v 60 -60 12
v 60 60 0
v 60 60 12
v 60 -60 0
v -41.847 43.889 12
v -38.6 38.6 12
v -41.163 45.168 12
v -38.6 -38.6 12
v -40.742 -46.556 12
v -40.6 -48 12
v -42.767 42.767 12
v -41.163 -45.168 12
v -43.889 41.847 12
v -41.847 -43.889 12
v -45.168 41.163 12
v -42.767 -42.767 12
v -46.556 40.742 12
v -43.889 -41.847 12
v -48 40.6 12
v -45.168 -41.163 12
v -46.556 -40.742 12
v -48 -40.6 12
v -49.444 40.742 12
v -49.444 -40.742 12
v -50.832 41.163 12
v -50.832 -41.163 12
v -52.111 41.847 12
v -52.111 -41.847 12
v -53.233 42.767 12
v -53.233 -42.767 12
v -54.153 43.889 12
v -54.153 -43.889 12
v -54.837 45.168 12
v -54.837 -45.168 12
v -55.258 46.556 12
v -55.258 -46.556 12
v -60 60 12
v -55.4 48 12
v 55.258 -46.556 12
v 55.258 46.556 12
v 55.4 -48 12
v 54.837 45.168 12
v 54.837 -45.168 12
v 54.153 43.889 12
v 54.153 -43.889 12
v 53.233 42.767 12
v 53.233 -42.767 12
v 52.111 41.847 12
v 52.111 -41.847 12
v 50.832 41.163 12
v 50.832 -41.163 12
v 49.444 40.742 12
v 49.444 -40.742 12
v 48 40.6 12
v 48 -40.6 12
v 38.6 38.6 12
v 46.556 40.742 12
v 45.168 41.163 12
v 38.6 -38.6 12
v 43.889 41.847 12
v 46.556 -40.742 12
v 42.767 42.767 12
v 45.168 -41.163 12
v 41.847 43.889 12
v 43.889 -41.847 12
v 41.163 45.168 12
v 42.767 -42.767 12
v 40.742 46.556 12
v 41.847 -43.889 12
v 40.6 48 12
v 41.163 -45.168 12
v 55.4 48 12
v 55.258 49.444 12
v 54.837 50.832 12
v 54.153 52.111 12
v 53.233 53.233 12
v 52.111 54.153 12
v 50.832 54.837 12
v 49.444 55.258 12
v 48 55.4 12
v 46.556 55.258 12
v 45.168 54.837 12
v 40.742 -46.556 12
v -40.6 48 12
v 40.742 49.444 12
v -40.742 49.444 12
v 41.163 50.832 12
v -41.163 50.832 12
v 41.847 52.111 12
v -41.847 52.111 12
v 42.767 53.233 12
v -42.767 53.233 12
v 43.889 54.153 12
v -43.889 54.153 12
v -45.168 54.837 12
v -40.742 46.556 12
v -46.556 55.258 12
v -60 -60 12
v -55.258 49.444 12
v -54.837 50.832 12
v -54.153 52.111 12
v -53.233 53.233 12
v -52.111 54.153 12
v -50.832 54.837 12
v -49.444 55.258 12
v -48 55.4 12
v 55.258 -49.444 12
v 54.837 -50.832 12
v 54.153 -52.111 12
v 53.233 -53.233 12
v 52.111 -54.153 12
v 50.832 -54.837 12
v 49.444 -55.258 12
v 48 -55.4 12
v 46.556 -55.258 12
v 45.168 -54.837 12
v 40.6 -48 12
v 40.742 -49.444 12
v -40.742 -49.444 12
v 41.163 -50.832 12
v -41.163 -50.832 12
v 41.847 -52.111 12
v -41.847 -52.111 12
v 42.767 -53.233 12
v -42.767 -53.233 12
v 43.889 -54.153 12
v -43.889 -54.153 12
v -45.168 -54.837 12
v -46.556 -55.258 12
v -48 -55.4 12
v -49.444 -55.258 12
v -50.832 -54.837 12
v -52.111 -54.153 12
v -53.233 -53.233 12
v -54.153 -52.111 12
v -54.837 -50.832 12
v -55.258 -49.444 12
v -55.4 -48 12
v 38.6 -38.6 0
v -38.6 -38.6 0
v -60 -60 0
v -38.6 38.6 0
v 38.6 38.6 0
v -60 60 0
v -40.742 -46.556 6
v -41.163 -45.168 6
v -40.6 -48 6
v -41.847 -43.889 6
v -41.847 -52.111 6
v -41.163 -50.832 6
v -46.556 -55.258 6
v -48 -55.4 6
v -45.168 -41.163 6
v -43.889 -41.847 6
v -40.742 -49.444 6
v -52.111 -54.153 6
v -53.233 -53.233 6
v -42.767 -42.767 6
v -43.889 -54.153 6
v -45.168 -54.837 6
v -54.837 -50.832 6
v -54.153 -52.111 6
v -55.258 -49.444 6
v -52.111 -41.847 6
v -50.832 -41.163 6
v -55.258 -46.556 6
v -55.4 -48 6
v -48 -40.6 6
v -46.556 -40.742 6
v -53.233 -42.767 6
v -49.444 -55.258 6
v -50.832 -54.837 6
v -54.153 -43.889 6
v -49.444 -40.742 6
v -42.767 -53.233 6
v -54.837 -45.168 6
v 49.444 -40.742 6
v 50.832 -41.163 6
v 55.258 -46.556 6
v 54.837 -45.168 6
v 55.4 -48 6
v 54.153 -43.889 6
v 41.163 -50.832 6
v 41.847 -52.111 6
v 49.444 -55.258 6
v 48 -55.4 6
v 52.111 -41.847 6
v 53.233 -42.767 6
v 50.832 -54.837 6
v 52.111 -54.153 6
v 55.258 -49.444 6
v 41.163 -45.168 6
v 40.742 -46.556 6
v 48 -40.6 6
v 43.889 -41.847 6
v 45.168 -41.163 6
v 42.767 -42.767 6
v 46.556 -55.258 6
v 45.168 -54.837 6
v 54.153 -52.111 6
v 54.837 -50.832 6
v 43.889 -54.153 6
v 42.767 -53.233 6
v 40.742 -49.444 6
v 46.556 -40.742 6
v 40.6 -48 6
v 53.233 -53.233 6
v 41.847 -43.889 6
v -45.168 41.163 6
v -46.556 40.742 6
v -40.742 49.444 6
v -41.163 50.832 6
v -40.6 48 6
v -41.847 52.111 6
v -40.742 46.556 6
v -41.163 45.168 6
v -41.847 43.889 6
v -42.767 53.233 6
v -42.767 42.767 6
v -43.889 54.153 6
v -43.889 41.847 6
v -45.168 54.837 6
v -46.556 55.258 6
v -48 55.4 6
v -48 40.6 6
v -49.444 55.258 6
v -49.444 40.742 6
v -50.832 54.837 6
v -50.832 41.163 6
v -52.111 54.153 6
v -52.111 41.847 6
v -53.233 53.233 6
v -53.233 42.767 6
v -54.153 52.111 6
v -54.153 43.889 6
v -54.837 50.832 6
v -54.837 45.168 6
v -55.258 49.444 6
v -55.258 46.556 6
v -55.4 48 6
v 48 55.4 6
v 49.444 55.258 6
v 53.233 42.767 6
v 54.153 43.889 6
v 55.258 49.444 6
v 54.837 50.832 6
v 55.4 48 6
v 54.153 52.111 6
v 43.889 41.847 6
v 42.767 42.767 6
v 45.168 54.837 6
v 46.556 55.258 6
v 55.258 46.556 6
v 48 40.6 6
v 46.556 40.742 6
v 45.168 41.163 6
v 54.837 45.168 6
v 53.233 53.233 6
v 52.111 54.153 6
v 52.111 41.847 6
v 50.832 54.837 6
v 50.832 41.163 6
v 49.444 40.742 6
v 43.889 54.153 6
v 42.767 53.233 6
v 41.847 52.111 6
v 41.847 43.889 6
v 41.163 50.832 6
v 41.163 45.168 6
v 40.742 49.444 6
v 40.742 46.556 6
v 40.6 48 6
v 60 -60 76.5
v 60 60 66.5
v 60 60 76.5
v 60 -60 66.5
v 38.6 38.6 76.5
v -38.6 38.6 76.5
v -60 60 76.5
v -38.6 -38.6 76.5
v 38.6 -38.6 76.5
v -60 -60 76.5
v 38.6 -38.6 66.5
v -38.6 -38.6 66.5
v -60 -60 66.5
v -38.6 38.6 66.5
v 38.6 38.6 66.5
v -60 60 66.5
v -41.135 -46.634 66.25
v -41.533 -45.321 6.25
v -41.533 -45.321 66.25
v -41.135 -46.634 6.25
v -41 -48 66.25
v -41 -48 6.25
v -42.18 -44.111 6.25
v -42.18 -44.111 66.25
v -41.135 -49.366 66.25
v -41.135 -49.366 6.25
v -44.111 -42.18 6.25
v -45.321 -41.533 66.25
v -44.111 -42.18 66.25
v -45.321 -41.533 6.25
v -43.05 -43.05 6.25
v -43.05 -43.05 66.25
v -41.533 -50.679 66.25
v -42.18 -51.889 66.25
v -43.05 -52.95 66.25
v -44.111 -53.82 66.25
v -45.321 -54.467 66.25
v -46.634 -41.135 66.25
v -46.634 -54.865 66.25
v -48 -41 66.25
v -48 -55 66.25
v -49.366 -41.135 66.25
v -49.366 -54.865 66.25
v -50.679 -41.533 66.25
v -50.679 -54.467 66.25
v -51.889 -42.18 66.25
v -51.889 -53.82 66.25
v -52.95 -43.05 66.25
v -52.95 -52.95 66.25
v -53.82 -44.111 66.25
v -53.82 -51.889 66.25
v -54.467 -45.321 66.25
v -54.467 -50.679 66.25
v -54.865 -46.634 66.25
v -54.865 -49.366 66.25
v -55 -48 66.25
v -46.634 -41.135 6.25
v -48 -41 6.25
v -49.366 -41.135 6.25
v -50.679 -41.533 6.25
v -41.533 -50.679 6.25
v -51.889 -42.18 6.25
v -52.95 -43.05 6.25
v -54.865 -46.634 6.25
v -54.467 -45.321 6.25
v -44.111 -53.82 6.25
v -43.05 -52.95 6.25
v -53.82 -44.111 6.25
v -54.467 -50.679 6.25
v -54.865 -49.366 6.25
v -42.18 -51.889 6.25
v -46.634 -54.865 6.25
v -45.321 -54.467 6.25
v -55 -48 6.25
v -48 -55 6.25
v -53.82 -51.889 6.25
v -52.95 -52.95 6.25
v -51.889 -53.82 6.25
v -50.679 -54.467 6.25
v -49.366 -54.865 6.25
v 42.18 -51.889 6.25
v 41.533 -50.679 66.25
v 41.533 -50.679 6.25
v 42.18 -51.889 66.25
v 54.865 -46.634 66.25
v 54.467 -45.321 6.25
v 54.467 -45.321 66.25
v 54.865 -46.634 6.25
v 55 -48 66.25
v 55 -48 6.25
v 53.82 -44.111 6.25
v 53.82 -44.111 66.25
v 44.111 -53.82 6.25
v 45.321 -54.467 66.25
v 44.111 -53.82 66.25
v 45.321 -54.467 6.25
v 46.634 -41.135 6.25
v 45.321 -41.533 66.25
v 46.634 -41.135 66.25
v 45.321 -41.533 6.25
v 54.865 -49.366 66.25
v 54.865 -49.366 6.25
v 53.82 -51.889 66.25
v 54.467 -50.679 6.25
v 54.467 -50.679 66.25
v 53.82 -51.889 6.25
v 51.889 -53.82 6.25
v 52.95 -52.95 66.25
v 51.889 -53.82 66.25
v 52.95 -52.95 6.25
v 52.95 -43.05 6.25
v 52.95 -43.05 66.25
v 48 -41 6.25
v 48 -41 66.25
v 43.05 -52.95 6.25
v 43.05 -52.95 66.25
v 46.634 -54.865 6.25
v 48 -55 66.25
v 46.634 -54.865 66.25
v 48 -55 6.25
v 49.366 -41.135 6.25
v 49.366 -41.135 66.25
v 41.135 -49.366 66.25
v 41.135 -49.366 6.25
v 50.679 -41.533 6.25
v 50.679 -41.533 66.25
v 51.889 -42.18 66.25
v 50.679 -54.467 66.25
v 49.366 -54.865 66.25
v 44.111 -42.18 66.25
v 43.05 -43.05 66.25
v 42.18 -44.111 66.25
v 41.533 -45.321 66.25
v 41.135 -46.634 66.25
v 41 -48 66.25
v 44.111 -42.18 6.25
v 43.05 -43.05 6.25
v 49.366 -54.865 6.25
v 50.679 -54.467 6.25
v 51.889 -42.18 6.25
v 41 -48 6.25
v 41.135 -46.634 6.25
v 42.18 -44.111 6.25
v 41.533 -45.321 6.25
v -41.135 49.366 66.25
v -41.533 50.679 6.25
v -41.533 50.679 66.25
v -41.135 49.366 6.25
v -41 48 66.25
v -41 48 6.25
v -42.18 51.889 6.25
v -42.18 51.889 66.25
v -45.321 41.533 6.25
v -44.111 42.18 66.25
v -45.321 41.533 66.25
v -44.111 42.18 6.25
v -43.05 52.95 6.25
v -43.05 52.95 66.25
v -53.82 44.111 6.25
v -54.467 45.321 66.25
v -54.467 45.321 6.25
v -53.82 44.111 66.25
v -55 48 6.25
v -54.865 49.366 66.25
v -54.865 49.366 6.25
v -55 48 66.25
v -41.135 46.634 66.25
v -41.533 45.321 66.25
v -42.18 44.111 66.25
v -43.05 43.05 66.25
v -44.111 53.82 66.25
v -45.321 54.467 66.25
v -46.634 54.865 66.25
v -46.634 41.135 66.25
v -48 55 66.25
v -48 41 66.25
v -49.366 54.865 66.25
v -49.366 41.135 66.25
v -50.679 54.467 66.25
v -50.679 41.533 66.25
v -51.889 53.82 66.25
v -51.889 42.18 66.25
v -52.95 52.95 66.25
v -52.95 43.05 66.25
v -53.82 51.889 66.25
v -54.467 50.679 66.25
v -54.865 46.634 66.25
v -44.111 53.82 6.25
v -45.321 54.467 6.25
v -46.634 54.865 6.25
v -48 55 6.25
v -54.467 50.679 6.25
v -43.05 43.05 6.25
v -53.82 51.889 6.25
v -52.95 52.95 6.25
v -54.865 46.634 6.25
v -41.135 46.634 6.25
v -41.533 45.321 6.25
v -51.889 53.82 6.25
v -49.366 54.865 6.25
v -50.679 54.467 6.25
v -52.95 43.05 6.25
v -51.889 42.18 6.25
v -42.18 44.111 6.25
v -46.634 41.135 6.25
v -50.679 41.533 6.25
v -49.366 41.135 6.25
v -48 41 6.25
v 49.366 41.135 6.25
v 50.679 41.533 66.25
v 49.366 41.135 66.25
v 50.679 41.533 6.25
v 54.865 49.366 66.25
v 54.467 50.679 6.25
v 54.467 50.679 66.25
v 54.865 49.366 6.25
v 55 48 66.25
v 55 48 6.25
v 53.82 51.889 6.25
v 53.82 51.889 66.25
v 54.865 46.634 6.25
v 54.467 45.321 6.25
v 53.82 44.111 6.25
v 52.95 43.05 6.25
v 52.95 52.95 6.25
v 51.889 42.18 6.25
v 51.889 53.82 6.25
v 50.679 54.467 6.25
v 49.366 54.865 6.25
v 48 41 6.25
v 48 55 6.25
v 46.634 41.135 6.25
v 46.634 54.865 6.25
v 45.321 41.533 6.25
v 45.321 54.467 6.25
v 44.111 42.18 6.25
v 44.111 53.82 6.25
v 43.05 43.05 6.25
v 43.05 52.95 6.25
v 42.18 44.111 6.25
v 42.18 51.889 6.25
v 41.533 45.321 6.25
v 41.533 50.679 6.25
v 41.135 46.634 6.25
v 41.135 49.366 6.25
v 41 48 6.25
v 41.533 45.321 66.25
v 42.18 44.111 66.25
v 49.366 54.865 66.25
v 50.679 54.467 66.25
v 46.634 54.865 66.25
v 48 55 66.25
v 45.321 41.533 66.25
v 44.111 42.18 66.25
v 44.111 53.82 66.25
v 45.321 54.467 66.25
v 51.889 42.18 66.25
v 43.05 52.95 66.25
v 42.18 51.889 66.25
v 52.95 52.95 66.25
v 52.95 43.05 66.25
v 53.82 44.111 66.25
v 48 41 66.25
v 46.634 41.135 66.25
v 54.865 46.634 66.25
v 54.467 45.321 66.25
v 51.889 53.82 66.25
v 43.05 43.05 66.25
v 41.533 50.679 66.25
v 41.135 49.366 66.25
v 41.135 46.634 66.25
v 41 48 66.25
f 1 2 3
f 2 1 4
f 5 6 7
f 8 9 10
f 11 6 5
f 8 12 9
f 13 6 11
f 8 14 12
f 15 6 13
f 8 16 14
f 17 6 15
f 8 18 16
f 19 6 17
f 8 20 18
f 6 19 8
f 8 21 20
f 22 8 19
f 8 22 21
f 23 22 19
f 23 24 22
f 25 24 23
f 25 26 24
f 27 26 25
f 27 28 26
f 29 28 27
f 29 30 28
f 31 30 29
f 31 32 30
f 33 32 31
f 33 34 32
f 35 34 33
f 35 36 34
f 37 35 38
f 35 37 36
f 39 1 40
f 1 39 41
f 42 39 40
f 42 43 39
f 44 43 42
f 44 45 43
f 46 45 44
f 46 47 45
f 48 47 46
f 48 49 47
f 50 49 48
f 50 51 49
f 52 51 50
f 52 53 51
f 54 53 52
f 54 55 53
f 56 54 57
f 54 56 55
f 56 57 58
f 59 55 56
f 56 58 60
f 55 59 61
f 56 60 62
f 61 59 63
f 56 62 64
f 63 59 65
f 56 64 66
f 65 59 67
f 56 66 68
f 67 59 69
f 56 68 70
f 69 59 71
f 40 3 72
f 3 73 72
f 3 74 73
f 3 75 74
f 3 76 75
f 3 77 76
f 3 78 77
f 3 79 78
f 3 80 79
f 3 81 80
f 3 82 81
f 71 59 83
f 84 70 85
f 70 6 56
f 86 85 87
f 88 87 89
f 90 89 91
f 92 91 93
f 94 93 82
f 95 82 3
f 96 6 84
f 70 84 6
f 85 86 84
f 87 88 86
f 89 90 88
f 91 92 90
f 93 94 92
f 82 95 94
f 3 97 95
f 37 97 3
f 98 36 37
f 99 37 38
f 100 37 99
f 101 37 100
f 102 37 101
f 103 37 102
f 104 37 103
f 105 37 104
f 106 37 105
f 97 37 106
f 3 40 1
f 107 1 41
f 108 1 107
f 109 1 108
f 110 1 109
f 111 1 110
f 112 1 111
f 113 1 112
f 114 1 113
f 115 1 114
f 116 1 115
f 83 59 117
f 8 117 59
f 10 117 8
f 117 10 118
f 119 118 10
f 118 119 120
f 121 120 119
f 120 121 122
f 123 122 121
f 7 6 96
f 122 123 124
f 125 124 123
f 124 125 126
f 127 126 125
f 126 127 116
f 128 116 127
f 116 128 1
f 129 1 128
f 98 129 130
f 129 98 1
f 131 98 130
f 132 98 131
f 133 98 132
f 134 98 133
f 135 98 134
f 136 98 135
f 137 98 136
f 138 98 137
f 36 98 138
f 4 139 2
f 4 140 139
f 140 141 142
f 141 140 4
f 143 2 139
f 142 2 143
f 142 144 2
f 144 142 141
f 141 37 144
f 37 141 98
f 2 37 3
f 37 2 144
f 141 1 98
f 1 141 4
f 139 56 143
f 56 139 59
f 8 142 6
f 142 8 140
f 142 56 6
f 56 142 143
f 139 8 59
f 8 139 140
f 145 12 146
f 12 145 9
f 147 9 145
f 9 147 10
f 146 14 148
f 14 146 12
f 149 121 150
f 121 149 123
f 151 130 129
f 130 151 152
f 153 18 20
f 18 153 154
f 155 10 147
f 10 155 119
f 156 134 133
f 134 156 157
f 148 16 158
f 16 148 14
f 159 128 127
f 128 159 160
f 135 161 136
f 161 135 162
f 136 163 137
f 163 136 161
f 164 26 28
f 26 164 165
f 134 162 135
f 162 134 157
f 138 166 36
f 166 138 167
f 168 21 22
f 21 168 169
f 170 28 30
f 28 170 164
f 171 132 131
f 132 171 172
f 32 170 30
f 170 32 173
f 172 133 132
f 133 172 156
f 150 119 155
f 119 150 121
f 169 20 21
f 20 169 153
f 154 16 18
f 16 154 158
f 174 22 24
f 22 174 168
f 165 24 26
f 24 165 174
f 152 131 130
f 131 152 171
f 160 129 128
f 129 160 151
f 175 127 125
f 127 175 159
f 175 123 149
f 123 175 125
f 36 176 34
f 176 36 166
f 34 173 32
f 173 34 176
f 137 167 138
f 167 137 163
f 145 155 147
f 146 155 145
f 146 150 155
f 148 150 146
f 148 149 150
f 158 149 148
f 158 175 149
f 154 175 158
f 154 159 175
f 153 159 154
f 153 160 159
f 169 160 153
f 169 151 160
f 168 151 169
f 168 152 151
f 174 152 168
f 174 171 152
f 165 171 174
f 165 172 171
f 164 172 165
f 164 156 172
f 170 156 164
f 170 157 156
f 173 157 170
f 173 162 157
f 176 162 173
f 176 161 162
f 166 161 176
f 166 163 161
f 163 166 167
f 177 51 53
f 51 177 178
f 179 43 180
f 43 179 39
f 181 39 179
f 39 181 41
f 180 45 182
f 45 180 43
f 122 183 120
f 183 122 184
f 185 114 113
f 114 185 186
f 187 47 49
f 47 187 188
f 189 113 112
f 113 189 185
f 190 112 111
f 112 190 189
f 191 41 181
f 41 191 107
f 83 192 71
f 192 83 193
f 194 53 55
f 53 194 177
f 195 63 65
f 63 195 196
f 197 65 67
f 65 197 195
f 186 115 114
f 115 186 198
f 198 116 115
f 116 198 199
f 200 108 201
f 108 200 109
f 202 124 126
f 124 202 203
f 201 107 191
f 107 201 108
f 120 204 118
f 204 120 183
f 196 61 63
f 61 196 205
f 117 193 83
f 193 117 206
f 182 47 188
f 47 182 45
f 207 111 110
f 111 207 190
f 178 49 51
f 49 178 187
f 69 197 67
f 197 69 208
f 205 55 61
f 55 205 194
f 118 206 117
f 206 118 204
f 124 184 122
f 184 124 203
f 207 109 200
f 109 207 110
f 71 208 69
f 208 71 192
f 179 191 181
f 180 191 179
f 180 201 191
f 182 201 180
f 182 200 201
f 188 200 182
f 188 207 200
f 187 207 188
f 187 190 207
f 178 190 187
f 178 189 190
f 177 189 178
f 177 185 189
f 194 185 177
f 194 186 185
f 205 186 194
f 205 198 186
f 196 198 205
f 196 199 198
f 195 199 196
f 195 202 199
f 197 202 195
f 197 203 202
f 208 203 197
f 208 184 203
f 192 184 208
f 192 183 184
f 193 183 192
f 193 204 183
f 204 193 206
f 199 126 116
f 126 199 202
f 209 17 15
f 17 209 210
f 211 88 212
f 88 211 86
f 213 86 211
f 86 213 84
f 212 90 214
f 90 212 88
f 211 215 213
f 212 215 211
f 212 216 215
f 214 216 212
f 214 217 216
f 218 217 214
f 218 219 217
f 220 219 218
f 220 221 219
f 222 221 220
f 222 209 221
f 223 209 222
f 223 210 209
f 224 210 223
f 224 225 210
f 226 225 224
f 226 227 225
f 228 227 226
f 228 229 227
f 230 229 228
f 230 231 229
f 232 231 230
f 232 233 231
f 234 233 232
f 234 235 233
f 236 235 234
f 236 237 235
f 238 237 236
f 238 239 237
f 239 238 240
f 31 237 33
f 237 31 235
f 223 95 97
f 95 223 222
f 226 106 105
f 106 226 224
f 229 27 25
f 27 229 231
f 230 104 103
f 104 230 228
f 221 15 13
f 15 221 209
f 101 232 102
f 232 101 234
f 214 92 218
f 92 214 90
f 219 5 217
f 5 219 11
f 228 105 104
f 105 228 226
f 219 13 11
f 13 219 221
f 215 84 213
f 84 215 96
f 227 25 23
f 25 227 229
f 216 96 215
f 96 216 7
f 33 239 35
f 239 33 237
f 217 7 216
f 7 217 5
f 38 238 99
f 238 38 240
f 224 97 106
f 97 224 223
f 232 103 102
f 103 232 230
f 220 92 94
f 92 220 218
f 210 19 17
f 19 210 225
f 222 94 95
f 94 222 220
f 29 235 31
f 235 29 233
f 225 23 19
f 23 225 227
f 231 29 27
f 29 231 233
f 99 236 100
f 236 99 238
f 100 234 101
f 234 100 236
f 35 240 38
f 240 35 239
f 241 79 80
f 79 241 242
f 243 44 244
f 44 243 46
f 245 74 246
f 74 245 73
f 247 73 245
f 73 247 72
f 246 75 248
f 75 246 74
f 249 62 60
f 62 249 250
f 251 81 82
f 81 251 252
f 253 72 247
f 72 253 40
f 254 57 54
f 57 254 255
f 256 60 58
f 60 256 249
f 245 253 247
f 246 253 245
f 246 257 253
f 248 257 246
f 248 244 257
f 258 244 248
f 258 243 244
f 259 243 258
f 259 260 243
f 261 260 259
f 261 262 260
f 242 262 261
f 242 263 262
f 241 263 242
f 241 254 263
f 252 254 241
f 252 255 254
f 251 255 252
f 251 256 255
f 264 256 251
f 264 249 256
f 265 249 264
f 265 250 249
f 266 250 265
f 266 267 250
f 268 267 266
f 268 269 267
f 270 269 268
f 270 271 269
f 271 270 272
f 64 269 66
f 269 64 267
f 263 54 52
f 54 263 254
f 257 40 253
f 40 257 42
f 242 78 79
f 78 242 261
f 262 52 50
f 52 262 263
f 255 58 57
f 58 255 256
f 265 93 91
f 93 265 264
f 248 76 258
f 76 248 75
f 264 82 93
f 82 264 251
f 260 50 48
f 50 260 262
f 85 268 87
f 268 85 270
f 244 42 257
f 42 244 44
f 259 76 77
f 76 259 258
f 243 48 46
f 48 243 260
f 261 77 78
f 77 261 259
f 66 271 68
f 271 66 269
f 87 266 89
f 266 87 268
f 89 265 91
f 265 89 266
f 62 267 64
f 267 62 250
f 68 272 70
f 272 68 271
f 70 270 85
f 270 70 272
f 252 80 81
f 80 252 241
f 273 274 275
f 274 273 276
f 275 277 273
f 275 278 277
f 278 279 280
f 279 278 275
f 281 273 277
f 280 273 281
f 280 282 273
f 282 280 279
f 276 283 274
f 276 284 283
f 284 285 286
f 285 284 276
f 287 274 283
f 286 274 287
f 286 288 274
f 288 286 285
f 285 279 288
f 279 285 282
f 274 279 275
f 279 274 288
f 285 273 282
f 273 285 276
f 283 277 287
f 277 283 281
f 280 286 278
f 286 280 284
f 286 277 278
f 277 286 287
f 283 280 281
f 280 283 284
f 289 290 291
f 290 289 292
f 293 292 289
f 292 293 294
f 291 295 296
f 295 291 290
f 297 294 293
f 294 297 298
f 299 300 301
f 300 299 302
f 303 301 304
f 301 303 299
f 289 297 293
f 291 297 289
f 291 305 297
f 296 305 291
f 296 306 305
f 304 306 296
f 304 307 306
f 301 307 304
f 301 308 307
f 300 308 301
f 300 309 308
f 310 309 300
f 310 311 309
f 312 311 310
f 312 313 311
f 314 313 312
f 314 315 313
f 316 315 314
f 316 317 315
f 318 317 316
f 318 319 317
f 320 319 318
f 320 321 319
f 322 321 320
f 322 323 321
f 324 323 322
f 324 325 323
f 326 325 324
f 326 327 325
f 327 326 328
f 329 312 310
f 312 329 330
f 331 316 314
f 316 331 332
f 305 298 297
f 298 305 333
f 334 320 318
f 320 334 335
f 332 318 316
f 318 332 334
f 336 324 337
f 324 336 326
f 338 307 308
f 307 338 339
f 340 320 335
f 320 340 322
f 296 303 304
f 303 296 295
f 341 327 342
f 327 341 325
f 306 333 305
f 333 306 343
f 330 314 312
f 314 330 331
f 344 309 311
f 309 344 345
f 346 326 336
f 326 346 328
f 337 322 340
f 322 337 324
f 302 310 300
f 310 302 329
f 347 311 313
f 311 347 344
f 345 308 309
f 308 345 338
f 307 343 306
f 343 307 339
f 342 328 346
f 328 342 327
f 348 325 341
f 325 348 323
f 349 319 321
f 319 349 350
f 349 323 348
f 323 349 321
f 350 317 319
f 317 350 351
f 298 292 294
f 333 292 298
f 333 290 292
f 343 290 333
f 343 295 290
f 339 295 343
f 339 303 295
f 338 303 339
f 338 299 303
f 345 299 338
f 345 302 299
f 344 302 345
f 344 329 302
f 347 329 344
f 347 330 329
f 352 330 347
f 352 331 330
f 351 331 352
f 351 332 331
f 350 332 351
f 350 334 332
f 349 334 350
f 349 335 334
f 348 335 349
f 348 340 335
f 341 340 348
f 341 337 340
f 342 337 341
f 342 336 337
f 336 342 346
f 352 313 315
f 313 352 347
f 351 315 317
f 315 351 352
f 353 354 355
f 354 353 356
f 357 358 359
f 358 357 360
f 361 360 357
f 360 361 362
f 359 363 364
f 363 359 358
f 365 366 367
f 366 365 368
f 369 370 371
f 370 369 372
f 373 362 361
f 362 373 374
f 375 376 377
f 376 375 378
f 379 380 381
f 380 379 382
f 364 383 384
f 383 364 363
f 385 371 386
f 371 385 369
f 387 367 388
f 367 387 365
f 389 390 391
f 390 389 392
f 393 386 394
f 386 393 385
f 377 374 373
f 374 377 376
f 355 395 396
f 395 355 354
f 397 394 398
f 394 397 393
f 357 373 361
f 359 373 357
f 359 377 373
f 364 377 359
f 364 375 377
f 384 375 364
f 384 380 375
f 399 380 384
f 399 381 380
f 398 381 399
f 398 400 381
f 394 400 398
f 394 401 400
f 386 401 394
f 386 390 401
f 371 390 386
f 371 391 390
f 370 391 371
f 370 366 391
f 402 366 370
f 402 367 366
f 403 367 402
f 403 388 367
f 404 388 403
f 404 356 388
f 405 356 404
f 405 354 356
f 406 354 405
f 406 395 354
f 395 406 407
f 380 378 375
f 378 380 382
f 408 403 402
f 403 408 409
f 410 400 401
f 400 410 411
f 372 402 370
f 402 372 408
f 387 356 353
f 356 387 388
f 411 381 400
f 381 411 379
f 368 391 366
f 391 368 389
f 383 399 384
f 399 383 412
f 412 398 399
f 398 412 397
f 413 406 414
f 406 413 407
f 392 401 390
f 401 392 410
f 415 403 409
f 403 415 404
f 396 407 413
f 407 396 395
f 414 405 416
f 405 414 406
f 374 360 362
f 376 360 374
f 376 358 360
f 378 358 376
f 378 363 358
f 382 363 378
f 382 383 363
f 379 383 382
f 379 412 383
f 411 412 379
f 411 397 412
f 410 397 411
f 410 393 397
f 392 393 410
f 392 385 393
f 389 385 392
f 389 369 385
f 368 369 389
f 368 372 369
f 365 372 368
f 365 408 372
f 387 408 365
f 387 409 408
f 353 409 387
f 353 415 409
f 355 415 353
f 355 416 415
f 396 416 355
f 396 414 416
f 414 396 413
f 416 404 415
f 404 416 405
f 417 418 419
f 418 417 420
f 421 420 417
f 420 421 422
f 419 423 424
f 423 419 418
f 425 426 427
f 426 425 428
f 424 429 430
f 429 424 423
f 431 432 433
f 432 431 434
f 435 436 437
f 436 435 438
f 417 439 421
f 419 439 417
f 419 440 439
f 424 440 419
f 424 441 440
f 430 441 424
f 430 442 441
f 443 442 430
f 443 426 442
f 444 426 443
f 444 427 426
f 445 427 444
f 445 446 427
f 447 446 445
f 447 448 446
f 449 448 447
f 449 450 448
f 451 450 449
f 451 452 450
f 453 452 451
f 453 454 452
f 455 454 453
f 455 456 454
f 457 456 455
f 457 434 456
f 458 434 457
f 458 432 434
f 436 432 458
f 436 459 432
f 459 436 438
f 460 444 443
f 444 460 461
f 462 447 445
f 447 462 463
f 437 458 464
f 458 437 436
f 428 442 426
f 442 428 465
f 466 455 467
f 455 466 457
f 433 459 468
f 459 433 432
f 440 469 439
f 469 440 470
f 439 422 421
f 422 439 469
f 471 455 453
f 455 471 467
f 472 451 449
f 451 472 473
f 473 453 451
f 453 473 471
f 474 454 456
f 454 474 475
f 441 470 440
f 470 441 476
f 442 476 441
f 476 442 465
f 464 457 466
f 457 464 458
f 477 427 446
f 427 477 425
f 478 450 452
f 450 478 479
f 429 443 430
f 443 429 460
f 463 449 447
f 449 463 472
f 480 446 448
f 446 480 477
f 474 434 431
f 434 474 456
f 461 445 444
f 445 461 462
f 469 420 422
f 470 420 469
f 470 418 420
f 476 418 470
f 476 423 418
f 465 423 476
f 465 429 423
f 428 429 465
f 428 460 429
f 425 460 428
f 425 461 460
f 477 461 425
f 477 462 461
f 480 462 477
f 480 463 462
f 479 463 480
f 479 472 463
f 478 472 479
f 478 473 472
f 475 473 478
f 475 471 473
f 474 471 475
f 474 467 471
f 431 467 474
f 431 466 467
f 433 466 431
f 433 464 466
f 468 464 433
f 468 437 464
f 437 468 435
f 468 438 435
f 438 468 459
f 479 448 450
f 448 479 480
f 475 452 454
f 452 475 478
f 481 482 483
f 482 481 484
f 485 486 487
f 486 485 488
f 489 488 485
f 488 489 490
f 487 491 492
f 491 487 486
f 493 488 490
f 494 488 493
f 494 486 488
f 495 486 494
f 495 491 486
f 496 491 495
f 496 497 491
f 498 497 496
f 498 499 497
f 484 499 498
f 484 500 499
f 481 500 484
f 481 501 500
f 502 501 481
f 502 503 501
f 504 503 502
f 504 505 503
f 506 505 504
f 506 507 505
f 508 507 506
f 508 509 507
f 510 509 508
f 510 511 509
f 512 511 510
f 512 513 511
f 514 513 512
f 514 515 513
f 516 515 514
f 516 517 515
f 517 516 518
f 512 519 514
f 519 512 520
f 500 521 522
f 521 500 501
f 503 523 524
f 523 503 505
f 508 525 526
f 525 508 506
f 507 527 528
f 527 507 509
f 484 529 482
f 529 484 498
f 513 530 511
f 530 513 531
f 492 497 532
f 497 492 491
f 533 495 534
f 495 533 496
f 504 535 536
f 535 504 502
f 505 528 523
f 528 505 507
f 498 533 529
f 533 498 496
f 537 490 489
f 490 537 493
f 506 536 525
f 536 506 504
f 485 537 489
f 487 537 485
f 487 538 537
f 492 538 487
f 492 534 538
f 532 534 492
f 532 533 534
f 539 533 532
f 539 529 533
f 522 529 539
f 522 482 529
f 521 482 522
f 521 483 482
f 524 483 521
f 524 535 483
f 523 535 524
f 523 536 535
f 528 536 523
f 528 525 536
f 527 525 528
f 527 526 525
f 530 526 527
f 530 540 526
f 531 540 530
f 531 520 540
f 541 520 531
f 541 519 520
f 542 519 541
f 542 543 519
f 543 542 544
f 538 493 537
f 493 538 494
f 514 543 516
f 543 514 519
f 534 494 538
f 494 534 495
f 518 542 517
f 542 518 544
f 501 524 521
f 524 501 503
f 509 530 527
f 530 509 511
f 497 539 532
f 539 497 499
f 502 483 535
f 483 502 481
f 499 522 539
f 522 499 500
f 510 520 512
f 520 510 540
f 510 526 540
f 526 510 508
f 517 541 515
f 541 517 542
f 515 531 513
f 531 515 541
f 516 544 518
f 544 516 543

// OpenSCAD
$fn = 32;

// ------------------------------------------------------------------------
// Frame cube: base 120 x 120 mm, posts 60 mm tall
// Every part is its own module, assembly() places every instance.
// ------------------------------------------------------------------------

// --- part 1 ---
module base_frame() {
  difference() {
    translate([-60, -60, 0]) cube([120, 120, 12]);
    translate([-38.6, -38.6, -1]) cube([77.2, 77.2, 14]);
    translate([-48, -48, 6]) cylinder(h = 7, d = 14.8);
    translate([48, -48, 6]) cylinder(h = 7, d = 14.8);
    translate([-48, 48, 6]) cylinder(h = 7, d = 14.8);
    translate([48, 48, 6]) cylinder(h = 7, d = 14.8);
  }
}

// --- part 2 ---
module corner_post() {
  cylinder(h = 60, d = 14);
}

// --- part 3 ---
module top_frame() {
  difference() {
    translate([-60, -60, 0]) cube([120, 120, 10]);
    translate([-38.6, -38.6, -1]) cube([77.2, 77.2, 12]);
  }
}

// --- assembly ---
module assembly() {
  color([0.80, 0.24, 0.20]) translate([0, 0, 0]) rotate([0, 0, 0]) base_frame();
  color([0.20, 0.45, 0.75]) translate([-48, -48, 6.25]) rotate([0, 0, 0]) corner_post();
  color([0.25, 0.62, 0.32]) translate([48, -48, 6.25]) rotate([0, 0, 0]) corner_post();
  color([0.92, 0.70, 0.18]) translate([-48, 48, 6.25]) rotate([0, 0, 0]) corner_post();
  color([0.58, 0.35, 0.70]) translate([48, 48, 6.25]) rotate([0, 0, 0]) corner_post();
  color([0.16, 0.66, 0.66]) translate([0, 0, 66.5]) rotate([0, 0, 0]) top_frame();
}

assembly();
